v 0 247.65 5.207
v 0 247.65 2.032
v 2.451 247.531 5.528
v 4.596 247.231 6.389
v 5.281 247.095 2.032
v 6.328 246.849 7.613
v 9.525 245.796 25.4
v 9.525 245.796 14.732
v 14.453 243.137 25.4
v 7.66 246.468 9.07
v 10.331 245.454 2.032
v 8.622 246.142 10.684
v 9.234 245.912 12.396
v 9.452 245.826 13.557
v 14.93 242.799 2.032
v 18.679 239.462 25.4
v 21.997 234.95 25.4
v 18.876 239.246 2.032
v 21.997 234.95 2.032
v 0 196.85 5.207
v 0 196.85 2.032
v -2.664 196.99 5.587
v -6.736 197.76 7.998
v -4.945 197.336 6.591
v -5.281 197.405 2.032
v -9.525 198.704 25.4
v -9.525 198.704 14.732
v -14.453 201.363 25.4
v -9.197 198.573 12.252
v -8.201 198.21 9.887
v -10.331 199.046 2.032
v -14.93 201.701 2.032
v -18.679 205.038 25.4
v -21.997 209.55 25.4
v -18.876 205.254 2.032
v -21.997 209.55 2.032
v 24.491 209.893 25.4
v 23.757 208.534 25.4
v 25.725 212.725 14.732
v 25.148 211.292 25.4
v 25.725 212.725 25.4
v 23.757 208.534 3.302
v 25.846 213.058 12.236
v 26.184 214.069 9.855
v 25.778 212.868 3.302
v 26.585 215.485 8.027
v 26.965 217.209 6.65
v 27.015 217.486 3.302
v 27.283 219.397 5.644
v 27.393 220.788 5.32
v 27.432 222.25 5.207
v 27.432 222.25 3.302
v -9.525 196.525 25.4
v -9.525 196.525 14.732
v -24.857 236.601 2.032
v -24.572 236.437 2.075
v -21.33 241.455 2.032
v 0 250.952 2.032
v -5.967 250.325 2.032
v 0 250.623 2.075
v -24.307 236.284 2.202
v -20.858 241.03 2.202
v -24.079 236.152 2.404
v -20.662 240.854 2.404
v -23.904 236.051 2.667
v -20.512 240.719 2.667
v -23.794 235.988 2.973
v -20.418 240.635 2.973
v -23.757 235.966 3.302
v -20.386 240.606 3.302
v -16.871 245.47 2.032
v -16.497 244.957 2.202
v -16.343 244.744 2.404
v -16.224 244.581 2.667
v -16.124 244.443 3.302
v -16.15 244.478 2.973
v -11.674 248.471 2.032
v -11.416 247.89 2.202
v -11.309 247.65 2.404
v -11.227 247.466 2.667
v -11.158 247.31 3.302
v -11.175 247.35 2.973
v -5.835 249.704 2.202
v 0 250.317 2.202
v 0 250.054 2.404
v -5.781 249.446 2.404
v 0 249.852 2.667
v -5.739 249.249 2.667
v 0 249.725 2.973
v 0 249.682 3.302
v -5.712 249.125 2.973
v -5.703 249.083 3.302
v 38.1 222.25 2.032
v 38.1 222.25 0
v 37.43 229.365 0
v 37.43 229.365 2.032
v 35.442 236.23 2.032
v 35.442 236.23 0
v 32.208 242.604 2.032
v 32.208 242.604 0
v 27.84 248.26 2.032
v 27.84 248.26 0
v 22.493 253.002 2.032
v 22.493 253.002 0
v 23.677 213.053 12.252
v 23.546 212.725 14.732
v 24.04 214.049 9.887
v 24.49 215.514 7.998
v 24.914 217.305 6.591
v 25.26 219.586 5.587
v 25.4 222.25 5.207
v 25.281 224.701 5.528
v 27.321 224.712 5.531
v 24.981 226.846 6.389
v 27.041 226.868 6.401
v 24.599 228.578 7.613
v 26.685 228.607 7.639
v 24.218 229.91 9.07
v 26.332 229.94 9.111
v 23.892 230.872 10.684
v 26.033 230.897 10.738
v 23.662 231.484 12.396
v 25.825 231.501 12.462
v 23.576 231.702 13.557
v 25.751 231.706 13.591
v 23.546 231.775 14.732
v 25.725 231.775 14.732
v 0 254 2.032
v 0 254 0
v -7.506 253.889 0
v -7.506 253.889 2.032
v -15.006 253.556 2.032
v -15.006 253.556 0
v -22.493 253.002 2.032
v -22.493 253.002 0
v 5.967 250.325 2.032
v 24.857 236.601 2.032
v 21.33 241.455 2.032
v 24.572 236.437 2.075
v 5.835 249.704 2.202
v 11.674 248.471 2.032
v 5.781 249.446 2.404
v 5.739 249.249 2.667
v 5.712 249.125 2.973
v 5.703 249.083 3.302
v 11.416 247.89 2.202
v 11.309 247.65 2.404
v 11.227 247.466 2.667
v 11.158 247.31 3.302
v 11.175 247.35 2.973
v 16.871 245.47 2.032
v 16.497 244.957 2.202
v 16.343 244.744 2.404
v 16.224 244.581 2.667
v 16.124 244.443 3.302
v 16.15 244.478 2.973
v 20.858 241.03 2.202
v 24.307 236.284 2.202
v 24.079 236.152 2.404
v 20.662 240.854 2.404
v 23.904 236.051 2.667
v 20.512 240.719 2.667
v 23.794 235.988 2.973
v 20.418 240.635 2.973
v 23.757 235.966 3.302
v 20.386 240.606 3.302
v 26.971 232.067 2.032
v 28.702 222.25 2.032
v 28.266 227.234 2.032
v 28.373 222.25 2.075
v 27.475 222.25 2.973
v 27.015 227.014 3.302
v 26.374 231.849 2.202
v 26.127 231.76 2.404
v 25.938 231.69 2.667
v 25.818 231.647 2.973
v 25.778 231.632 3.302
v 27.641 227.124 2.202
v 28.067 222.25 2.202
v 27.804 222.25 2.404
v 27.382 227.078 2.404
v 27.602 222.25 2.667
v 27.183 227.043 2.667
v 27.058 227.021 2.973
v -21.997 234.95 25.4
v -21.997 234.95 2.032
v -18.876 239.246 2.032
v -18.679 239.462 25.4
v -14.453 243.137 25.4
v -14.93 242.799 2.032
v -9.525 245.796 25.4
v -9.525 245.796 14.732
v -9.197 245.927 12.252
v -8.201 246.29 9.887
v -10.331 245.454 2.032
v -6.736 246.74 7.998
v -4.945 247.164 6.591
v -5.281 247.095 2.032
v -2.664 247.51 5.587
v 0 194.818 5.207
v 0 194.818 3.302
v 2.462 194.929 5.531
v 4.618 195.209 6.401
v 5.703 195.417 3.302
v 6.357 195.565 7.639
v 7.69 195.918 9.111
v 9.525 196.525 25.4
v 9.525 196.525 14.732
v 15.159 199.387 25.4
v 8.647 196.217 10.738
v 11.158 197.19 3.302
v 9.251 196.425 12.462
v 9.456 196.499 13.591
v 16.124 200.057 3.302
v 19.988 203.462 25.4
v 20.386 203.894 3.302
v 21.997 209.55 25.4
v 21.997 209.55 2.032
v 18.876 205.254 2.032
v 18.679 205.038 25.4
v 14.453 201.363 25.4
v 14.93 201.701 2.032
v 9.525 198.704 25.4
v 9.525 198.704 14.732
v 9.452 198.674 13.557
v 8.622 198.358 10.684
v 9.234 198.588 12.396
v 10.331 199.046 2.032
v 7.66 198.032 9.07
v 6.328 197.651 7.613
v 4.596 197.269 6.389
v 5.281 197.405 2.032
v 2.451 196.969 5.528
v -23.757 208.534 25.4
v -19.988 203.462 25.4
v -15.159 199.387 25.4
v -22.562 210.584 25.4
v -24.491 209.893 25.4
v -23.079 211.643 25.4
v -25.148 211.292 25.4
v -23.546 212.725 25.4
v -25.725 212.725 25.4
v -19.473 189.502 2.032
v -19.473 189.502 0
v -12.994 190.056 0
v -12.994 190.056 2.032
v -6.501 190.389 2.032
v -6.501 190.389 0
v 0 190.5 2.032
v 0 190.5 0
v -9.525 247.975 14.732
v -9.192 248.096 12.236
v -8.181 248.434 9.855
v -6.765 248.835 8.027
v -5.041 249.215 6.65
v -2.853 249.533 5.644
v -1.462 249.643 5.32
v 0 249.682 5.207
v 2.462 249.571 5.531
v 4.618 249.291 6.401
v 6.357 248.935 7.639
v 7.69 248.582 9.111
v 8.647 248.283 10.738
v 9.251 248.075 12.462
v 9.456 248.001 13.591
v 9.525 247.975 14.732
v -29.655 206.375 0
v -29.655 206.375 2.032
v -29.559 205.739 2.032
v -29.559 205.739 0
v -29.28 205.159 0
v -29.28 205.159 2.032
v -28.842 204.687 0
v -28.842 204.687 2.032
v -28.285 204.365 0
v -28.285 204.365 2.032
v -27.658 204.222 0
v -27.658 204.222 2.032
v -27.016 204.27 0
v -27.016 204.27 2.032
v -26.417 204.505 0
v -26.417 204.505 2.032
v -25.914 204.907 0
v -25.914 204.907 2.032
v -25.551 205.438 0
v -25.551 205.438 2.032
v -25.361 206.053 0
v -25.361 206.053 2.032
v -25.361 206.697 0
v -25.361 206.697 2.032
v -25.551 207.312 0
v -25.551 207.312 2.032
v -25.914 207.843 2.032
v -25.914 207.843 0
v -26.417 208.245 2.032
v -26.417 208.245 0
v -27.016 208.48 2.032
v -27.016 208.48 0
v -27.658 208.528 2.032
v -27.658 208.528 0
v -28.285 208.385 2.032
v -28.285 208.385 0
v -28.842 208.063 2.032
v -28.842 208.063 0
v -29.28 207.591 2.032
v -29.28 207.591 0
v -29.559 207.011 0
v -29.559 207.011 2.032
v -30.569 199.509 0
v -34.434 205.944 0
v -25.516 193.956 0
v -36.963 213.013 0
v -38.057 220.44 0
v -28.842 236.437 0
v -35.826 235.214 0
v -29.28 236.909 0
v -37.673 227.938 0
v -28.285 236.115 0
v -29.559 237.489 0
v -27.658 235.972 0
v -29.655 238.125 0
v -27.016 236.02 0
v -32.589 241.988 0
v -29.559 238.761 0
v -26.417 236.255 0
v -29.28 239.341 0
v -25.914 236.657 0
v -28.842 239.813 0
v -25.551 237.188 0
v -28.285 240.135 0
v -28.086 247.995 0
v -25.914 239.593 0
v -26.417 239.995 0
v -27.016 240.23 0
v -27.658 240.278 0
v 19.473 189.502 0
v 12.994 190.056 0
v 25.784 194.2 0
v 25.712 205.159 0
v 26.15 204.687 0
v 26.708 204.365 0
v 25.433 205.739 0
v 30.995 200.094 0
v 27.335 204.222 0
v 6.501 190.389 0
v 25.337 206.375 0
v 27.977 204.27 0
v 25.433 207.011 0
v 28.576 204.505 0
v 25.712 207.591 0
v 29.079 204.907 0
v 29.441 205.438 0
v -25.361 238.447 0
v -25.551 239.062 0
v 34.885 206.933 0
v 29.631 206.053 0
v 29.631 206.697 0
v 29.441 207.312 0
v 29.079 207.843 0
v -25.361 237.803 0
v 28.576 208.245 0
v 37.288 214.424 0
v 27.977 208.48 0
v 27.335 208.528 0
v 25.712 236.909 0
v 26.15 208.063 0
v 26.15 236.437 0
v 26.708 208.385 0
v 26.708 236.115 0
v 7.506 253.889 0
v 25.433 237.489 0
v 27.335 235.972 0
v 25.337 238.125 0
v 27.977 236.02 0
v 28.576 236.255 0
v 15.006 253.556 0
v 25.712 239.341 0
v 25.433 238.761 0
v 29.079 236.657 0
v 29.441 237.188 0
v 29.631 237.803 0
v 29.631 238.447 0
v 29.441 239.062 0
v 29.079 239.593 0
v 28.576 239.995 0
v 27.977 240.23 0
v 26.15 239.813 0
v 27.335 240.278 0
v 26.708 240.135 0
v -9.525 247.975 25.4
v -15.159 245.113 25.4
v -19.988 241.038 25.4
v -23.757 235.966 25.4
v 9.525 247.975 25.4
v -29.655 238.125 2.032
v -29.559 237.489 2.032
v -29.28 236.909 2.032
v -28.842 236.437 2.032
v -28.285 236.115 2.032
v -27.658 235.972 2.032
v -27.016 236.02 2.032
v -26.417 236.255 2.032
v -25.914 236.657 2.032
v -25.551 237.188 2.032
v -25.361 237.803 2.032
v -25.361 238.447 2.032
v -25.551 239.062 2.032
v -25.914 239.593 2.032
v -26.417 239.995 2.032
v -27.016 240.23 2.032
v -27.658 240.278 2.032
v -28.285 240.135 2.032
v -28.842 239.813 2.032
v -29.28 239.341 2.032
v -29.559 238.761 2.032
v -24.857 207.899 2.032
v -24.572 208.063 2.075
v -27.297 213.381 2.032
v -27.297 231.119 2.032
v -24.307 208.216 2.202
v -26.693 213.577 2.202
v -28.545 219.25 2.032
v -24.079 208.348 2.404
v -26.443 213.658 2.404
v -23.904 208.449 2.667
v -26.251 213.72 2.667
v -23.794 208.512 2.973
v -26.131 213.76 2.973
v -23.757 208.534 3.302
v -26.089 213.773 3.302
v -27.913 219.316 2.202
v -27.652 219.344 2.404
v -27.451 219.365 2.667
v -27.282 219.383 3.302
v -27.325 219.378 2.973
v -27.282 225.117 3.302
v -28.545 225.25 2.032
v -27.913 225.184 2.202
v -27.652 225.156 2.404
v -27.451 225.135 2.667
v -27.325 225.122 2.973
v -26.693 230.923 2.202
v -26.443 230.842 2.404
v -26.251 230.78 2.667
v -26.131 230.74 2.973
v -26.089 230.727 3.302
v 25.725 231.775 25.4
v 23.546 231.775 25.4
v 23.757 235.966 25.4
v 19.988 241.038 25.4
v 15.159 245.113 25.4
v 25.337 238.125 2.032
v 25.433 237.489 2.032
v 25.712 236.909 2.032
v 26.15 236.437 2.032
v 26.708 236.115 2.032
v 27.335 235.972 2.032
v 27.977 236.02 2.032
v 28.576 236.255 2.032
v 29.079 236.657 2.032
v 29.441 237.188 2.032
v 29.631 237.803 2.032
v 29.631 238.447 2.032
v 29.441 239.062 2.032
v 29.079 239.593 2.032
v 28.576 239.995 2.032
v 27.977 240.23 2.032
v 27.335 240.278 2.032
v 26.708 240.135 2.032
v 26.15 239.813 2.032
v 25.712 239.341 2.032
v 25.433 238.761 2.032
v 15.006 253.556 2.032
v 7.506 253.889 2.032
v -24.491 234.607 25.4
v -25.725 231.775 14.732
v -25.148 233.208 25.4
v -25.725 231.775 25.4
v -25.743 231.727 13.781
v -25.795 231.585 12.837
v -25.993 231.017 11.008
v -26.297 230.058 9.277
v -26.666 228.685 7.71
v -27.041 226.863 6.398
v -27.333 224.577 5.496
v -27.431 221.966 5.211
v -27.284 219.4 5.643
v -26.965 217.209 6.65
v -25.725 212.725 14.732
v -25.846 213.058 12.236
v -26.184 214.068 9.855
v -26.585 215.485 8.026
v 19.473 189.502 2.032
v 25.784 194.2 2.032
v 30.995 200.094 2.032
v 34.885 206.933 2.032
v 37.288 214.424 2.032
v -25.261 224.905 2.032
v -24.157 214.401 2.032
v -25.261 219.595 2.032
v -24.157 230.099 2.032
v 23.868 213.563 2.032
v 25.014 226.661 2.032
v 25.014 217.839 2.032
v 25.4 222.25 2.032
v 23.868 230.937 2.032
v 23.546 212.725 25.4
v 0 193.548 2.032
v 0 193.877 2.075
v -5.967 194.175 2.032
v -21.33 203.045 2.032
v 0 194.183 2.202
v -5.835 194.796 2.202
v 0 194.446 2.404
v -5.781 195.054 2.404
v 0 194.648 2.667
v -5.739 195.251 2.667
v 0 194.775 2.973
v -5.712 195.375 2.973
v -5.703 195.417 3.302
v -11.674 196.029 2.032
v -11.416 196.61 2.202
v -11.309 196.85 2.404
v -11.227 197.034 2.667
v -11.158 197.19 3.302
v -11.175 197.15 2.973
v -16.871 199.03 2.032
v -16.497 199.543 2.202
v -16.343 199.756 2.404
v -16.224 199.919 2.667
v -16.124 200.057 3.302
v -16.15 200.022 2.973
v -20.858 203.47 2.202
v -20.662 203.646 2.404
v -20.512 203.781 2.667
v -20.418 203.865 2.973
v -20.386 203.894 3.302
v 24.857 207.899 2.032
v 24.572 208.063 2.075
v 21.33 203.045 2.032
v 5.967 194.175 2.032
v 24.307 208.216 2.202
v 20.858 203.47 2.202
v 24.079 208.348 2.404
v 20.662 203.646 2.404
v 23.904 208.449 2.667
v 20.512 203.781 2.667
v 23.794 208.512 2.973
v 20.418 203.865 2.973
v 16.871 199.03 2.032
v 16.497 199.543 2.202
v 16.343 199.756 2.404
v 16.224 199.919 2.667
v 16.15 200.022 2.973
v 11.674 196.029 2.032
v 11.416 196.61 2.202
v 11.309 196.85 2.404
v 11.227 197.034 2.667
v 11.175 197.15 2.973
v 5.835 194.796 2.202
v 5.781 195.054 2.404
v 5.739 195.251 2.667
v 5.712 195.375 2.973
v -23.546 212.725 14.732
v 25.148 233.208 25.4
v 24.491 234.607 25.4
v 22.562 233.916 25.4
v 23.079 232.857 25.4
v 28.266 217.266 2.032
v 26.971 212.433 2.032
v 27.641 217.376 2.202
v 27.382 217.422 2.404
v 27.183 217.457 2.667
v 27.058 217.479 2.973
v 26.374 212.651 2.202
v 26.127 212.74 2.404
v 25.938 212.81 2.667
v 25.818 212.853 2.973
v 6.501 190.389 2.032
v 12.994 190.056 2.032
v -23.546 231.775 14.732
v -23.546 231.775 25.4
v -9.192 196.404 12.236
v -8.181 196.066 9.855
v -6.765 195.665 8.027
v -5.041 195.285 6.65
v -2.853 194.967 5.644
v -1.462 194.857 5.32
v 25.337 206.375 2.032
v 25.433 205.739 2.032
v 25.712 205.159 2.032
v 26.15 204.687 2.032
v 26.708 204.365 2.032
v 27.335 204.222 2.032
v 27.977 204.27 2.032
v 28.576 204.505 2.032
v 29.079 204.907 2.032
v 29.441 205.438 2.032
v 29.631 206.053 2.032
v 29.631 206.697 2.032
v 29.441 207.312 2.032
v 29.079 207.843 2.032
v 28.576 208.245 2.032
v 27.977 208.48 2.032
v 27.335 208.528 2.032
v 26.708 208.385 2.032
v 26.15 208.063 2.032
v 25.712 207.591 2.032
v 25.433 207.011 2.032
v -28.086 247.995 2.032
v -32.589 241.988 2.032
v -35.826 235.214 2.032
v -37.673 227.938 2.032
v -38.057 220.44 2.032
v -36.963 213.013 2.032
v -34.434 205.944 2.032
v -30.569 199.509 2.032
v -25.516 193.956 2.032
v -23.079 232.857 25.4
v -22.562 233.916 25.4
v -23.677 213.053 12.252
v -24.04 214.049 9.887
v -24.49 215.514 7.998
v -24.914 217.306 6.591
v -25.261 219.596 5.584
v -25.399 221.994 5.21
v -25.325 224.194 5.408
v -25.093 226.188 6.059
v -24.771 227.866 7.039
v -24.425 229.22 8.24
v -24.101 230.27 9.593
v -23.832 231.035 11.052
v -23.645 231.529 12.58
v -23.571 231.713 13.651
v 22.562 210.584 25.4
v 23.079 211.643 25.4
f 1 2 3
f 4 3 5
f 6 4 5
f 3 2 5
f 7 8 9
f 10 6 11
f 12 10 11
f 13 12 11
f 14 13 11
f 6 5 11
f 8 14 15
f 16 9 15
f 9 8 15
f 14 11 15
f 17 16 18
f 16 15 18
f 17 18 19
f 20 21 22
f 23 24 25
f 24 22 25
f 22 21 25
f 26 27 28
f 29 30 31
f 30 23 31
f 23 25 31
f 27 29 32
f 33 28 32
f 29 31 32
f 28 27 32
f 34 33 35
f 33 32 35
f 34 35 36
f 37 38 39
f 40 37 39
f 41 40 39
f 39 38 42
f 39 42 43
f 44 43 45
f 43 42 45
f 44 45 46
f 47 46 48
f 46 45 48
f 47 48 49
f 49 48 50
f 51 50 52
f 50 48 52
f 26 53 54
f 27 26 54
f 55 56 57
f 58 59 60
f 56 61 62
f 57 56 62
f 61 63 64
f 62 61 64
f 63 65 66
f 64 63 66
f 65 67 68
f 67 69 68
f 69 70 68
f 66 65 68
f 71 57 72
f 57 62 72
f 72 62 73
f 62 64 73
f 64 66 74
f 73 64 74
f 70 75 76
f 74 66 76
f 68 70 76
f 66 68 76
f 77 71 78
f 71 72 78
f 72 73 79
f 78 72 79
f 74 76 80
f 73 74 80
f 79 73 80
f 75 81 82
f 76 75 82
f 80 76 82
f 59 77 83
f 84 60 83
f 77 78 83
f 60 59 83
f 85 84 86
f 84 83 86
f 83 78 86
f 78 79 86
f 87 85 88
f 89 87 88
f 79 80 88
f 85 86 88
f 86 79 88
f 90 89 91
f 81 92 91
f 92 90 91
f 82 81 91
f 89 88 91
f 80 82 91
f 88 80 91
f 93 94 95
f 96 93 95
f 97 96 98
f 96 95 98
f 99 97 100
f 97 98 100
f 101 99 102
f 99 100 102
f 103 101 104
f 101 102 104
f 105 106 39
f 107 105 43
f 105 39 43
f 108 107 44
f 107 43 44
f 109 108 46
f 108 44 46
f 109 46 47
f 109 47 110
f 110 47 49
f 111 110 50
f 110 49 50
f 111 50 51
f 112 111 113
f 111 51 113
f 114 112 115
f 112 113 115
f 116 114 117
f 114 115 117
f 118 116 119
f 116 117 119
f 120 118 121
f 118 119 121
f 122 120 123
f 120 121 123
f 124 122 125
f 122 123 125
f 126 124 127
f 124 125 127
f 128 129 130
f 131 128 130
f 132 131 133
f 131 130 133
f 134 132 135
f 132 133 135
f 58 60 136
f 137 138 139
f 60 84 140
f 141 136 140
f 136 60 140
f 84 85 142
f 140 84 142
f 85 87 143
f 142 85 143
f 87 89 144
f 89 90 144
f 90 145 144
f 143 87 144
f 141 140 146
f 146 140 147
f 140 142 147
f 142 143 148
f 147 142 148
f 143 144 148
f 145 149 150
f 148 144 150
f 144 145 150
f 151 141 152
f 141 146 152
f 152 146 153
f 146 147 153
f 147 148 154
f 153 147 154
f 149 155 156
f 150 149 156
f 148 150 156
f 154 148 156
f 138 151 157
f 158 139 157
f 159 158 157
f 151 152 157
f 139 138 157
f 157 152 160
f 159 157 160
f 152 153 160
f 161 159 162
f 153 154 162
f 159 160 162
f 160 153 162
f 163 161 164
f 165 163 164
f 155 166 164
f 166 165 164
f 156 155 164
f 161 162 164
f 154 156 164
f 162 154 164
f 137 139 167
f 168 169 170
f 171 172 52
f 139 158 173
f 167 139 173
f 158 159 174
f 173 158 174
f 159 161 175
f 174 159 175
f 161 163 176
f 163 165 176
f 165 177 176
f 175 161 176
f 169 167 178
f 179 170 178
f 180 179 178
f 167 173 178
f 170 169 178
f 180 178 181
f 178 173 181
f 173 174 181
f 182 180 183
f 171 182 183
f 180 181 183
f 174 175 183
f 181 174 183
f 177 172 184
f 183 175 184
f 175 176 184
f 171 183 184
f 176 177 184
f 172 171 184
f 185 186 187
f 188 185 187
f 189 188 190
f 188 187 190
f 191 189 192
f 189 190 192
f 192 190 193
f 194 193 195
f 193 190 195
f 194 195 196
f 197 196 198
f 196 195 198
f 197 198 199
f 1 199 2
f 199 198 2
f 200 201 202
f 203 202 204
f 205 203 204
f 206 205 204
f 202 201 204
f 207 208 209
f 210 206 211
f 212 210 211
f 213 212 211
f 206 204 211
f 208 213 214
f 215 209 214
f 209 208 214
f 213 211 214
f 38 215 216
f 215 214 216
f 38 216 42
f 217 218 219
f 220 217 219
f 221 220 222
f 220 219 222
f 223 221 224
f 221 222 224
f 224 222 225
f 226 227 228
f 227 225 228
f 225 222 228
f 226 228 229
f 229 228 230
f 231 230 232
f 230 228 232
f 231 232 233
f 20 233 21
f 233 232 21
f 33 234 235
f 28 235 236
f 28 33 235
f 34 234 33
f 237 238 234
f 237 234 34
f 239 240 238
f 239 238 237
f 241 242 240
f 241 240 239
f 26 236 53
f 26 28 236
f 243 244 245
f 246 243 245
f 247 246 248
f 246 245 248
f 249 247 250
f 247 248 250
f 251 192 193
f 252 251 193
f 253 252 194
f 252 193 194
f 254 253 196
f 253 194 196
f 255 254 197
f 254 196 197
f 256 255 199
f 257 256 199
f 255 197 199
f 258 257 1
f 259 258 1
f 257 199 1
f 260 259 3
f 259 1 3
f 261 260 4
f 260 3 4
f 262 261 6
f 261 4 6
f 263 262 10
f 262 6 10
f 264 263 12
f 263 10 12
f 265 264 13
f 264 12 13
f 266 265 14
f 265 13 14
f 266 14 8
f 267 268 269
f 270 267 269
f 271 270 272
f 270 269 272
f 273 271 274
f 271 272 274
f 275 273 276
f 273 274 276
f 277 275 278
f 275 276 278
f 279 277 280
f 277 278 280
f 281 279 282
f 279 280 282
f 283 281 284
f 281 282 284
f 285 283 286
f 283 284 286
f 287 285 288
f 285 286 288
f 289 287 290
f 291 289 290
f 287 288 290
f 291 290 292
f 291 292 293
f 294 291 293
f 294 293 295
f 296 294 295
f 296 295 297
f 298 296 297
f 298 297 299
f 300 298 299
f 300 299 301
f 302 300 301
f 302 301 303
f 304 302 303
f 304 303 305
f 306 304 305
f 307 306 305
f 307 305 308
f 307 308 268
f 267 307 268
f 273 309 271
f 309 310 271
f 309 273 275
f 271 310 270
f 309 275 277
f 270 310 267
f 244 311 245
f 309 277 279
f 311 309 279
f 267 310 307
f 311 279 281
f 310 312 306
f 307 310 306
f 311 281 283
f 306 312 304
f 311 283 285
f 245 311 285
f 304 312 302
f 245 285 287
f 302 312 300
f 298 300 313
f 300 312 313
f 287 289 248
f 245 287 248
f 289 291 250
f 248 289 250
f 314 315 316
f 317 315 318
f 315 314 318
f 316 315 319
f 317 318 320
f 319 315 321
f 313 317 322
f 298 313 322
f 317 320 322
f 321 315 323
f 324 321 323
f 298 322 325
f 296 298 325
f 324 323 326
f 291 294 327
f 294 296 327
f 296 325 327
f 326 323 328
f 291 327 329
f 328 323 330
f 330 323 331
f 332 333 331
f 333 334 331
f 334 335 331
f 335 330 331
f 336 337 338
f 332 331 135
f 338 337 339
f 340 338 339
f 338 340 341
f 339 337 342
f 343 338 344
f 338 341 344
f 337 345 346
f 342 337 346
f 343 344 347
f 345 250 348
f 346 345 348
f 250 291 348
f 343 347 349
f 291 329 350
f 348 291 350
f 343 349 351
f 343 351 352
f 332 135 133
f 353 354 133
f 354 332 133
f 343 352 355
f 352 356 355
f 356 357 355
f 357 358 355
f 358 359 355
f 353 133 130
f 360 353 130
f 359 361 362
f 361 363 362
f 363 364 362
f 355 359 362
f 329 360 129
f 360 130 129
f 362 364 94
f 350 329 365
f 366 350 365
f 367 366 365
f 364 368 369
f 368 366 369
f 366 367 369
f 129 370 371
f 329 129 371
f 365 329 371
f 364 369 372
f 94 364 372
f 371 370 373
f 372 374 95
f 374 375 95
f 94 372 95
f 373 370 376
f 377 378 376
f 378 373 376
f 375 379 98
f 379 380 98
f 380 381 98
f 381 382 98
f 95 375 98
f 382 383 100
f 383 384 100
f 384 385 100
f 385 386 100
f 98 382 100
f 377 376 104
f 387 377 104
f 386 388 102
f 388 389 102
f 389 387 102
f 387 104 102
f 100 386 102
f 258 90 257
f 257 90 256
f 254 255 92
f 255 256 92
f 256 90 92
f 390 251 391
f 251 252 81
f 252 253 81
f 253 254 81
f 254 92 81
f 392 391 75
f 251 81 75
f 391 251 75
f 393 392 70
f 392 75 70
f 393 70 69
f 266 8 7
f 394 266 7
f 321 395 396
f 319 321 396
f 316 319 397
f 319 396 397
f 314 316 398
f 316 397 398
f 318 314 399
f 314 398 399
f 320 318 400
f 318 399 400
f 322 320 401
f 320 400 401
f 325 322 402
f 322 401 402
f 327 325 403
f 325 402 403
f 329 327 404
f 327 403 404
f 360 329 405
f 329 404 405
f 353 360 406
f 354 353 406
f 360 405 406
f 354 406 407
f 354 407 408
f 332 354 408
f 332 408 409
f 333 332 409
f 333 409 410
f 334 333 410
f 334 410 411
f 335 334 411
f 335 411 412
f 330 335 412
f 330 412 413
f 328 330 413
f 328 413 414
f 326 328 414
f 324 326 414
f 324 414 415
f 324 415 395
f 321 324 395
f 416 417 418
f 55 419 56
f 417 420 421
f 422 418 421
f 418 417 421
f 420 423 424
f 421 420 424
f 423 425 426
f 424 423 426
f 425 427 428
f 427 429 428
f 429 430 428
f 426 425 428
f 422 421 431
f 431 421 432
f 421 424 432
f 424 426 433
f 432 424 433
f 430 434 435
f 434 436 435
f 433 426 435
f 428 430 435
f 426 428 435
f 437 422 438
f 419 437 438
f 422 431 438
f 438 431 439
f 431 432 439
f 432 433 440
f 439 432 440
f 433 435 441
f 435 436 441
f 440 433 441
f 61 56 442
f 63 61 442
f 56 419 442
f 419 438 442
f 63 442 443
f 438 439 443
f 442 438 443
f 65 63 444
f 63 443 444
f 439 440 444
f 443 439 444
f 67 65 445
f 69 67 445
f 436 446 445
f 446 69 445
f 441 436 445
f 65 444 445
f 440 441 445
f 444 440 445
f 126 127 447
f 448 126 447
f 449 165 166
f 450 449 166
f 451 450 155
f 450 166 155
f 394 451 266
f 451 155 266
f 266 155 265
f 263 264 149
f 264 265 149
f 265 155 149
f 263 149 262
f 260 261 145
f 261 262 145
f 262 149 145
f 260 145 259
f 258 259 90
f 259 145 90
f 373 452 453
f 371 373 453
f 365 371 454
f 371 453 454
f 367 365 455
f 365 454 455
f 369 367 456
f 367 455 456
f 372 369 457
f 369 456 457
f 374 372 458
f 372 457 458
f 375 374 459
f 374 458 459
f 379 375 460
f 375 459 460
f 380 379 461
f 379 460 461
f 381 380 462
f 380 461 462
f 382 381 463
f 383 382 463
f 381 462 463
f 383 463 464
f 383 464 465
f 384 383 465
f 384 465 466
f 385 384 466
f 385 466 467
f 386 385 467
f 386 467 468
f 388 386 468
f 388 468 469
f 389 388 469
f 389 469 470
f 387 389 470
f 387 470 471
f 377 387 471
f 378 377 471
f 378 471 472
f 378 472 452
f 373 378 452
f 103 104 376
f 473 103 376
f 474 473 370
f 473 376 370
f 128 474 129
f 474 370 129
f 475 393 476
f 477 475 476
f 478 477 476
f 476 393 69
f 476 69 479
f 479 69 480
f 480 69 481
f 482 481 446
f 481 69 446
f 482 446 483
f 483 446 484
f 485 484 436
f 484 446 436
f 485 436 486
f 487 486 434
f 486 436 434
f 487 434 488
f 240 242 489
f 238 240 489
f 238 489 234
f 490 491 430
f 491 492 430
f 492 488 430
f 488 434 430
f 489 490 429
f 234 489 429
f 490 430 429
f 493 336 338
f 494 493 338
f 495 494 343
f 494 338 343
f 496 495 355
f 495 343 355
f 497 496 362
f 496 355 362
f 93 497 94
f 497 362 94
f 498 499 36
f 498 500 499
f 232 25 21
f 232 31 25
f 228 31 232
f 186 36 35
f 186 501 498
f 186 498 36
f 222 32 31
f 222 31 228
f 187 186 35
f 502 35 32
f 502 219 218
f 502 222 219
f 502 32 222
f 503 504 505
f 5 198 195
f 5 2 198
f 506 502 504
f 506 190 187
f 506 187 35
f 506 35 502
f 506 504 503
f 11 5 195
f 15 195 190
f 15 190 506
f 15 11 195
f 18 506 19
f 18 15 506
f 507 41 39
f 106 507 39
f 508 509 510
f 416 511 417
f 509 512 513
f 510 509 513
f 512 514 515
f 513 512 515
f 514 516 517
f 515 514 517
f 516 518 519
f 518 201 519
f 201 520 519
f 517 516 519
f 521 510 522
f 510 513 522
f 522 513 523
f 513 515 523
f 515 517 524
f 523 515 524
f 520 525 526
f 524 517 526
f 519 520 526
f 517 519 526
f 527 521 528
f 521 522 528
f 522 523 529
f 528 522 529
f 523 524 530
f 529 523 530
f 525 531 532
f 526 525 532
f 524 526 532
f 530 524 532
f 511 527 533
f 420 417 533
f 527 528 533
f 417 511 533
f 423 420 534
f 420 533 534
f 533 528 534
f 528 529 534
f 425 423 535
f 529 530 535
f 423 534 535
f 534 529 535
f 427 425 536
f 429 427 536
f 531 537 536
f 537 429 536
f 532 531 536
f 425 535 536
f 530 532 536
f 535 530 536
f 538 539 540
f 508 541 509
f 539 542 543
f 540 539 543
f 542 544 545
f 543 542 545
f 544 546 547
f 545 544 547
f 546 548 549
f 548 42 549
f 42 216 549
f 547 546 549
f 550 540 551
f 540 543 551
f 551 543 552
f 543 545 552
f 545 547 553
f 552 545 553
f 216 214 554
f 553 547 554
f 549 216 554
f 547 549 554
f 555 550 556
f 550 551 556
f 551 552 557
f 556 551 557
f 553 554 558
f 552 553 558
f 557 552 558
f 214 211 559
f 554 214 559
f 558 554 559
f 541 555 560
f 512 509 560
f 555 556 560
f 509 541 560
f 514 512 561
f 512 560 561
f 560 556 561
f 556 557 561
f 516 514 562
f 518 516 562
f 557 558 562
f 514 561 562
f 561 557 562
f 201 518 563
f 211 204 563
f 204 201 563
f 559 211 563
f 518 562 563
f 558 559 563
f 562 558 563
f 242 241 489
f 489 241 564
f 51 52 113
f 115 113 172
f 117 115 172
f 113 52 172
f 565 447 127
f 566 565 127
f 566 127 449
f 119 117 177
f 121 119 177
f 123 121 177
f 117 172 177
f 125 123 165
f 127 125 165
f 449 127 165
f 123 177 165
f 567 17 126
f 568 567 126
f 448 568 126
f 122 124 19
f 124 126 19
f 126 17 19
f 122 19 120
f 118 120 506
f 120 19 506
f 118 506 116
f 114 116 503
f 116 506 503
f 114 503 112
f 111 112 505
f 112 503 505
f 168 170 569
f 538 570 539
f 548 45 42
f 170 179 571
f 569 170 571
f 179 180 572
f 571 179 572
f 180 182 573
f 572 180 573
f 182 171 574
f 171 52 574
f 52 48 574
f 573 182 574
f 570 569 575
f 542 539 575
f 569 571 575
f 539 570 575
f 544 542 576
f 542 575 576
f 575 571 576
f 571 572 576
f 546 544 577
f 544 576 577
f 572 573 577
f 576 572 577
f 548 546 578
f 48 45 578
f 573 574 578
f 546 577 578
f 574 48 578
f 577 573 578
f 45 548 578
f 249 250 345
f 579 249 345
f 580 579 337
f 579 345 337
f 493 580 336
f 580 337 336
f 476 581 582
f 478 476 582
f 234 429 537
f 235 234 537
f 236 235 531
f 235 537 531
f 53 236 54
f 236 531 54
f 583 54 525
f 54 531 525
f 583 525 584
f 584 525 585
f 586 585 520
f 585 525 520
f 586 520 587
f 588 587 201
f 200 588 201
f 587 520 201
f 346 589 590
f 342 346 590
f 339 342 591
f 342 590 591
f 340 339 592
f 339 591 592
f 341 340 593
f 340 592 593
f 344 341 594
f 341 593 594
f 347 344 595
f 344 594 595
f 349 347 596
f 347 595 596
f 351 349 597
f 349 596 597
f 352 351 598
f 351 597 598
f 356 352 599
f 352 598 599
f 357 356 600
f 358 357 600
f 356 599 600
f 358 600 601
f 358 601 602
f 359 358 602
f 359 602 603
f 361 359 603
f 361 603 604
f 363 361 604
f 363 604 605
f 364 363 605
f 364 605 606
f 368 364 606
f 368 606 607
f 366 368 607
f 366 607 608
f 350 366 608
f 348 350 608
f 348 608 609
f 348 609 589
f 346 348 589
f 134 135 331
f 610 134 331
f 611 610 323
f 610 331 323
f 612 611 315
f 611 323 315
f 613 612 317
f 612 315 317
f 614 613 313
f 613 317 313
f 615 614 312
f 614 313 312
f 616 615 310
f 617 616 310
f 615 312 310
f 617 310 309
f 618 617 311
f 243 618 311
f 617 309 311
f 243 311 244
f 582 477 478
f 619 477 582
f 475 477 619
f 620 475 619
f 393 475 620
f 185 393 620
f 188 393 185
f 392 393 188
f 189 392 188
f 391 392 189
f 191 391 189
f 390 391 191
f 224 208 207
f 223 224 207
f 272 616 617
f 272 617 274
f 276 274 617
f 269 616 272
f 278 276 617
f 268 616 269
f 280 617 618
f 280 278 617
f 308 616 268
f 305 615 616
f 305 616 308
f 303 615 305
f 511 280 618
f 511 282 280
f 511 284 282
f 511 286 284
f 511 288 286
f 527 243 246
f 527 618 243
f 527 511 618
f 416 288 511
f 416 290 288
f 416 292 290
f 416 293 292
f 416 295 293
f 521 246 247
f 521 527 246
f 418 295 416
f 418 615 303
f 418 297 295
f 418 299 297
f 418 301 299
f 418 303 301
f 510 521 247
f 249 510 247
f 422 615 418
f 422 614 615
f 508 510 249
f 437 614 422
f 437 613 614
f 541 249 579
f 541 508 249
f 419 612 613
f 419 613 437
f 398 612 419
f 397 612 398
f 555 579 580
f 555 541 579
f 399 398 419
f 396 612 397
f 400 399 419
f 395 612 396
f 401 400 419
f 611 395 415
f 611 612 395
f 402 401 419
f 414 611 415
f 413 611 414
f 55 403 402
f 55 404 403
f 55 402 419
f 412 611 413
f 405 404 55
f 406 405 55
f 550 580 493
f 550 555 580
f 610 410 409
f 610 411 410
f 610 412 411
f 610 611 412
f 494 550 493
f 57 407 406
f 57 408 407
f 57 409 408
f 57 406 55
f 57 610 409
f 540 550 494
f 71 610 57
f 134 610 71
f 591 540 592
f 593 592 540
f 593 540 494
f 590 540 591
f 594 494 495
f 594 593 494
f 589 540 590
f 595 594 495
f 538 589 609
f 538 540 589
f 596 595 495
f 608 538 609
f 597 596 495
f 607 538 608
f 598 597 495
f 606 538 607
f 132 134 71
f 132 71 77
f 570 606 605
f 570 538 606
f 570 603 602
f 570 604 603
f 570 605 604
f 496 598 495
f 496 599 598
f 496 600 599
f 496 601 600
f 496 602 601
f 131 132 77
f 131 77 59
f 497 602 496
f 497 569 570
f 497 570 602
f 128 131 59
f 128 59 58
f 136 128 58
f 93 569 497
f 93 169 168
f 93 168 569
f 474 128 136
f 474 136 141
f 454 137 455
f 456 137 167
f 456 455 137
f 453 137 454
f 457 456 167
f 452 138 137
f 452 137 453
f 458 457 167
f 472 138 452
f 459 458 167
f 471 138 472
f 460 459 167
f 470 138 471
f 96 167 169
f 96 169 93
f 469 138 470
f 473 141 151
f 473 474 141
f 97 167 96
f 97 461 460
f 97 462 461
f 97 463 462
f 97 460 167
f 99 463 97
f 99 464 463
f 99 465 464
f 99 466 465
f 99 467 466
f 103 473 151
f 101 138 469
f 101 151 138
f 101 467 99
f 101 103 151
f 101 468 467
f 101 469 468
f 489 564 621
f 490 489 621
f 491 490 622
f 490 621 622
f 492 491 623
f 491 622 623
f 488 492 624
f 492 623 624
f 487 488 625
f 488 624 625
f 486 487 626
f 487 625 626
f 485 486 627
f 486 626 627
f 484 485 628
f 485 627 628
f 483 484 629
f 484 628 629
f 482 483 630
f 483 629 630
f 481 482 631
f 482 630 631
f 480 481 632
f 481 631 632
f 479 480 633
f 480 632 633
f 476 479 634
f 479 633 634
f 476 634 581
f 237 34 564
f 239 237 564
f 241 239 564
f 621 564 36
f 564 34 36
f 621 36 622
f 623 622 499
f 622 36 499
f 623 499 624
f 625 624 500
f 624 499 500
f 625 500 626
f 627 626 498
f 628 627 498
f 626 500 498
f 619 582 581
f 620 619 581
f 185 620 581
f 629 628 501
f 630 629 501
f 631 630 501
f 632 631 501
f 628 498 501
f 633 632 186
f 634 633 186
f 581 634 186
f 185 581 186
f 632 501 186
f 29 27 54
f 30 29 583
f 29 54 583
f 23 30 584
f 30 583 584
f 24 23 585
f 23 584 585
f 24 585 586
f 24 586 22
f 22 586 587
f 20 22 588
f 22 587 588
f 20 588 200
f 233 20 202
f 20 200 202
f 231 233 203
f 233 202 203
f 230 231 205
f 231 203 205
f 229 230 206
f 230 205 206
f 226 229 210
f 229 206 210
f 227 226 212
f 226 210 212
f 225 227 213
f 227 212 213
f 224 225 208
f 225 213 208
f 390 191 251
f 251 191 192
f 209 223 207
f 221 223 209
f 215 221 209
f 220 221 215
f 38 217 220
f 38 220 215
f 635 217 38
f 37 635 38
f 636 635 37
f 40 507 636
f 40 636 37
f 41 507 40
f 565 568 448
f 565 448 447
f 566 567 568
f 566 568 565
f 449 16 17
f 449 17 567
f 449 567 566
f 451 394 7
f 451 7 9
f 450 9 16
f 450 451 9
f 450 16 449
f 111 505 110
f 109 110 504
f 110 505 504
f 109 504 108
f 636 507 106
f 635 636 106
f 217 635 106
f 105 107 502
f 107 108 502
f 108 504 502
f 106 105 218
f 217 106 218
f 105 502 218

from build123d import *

# Parameters (mm, degrees)
F1_DEPTH  = 2.032
F2_DEPTH  = 25.4
F3_D      = 4.318
F3_DEPTH  = 5.08
F3_TIP    = 1.2972580765
F6_DEPTH  = 63.5
F10_DEPTH = 63.5
F11_R     = 1.27


with BuildPart() as f1:
    # F0 (on Top) → F1 (new body)
    with BuildSketch(Plane.XY):
        with BuildLine():
            ThreePointArc((-19.4727464049, 189.5021428571), (-9.7491483145, 190.2503721603), (0, 190.5))
            ThreePointArc((0, 190.5), (-15.875, 194.7536934298), (-27.4963065702, 206.375))
            ThreePointArc((-27.4963065702, 206.375), (-31.75, 222.25), (-27.4963065702, 238.125))
            ThreePointArc((-27.4963065702, 238.125), (-15.875, 249.7463065702), (0, 254))
            ThreePointArc((0, 254), (-11.2573468074, 253.750413089), (-22.4925700998, 253.0021428571))
            ThreePointArc((-22.4925700998, 253.0021428571), (-38.0569894676, 220.440151204), (-19.4727464049, 189.5021428571))
        make_face()
        with BuildLine():
            Line((0, 249.682), (0, 254))
            ThreePointArc((0, 254), (-15.875, 249.7463065702), (-27.4963065702, 238.125))
            Line((-27.4963065702, 238.125), (-23.7568088766, 235.966))
            ThreePointArc((-23.7568088766, 235.966), (-13.716, 246.0068088766), (0, 249.682))
        make_face()
        with BuildLine():
            ThreePointArc((-27.4963065702, 238.125), (-31.75, 222.25), (-27.4963065702, 206.375))
            Line((-27.4963065702, 206.375), (-23.7568088766, 208.534))
            ThreePointArc((-23.7568088766, 208.534), (-27.432, 222.25), (-23.7568088766, 235.966))
            Line((-23.7568088766, 235.966), (-27.4963065702, 238.125))
        make_face()
        with BuildLine():
            ThreePointArc((-23.7568088766, 235.966), (-27.432, 222.25), (-23.7568088766, 208.534))
            Line((-23.7568088766, 208.534), (-21.9970452561, 209.55))
            ThreePointArc((-21.9970452561, 209.55), (-25.4, 222.25), (-21.9970452561, 234.95))
            Line((-21.9970452561, 234.95), (-23.7568088766, 235.966))
        make_face()
        with BuildLine():
            ThreePointArc((-27.4963065702, 206.375), (-15.875, 194.7536934298), (0, 190.5))
            Line((0, 190.5), (0, 194.818))
            ThreePointArc((0, 194.818), (-13.716, 198.4931911234), (-23.7568088766, 208.534))
            Line((-23.7568088766, 208.534), (-27.4963065702, 206.375))
        make_face()
        with BuildLine():
            ThreePointArc((-23.7568088766, 208.534), (-13.716, 198.4931911234), (0, 194.818))
            Line((0, 194.818), (0, 196.85))
            ThreePointArc((0, 196.85), (-12.7, 200.2529547439), (-21.9970452561, 209.55))
            Line((-21.9970452561, 209.55), (-23.7568088766, 208.534))
        make_face()
        with BuildLine():
            ThreePointArc((-21.9970452561, 209.55), (-12.7, 200.2529547439), (0, 196.85))
            Line((0, 196.85), (0, 222.25))
            Line((0, 222.25), (-21.9970452561, 209.55))
        make_face()
        with BuildLine():
            Line((-21.9970452561, 209.55), (0, 222.25))
            Line((0, 222.25), (-21.9970452561, 234.95))
            ThreePointArc((-21.9970452561, 234.95), (-25.4, 222.25), (-21.9970452561, 209.55))
        make_face()
        with BuildLine():
            Line((-21.9970452561, 234.95), (0, 222.25))
            Line((0, 222.25), (0, 247.65))
            ThreePointArc((0, 247.65), (-12.7, 244.2470452561), (-21.9970452561, 234.95))
        make_face()
        with BuildLine():
            Line((0, 247.65), (0, 249.682))
            ThreePointArc((0, 249.682), (-13.716, 246.0068088766), (-23.7568088766, 235.966))
            Line((-23.7568088766, 235.966), (-21.9970452561, 234.95))
            ThreePointArc((-21.9970452561, 234.95), (-12.7, 244.2470452561), (0, 247.65))
        make_face()
        with BuildLine():
            ThreePointArc((27.4963065702, 238.125), (15.875, 249.7463065702), (0, 254))
            Line((0, 254), (0, 249.682))
            ThreePointArc((0, 249.682), (13.716, 246.0068088766), (23.7568088766, 235.966))
            Line((23.7568088766, 235.966), (27.4963065702, 238.125))
        make_face()
        with BuildLine():
            ThreePointArc((23.7568088766, 235.966), (13.716, 246.0068088766), (0, 249.682))
            Line((0, 249.682), (0, 247.65))
            ThreePointArc((0, 247.65), (12.7, 244.2470452561), (21.9970452561, 234.95))
            Line((21.9970452561, 234.95), (23.7568088766, 235.966))
        make_face()
        with BuildLine():
            Line((0, 247.65), (0, 222.25))
            Line((0, 222.25), (21.9970452561, 234.95))
            ThreePointArc((21.9970452561, 234.95), (12.7, 244.2470452561), (0, 247.65))
        make_face()
        with BuildLine():
            ThreePointArc((0, 190.5), (9.7491483145, 190.2503721603), (19.4727464049, 189.5021428571))
            ThreePointArc((19.4727464049, 189.5021428571), (33.1173794104, 203.4125590648), (38.1, 222.25))
            ThreePointArc((38.1, 222.25), (33.9748209767, 239.493014226), (22.4925700998, 253.0021428571))
            ThreePointArc((22.4925700998, 253.0021428571), (11.2573468074, 253.750413089), (0, 254))
            ThreePointArc((0, 254), (15.875, 249.7463065702), (27.4963065702, 238.125))
            ThreePointArc((27.4963065702, 238.125), (30.6681449847, 230.467504682), (31.75, 222.25))
            ThreePointArc((31.75, 222.25), (30.6681449847, 214.032495318), (27.4963065702, 206.375))
            ThreePointArc((27.4963065702, 206.375), (15.875, 194.7536934298), (0, 190.5))
        make_face()
        with BuildLine():
            Line((23.7568088766, 208.534), (27.4963065702, 206.375))
            ThreePointArc((27.4963065702, 206.375), (30.6681449847, 214.032495318), (31.75, 222.25))
            ThreePointArc((31.75, 222.25), (30.6681449847, 230.467504682), (27.4963065702, 238.125))
            Line((27.4963065702, 238.125), (23.7568088766, 235.966))
            ThreePointArc((23.7568088766, 235.966), (26.4972772668, 229.3499240453), (27.432, 222.25))
            ThreePointArc((27.432, 222.25), (26.4972772668, 215.1500759547), (23.7568088766, 208.534))
        make_face()
        with BuildLine():
            Line((21.9970452561, 209.55), (23.7568088766, 208.534))
            ThreePointArc((23.7568088766, 208.534), (26.4972772668, 215.1500759547), (27.432, 222.25))
            ThreePointArc((27.432, 222.25), (26.4972772668, 229.3499240453), (23.7568088766, 235.966))
            Line((23.7568088766, 235.966), (21.9970452561, 234.95))
            ThreePointArc((21.9970452561, 234.95), (24.5345159877, 228.8240037456), (25.4, 222.25))
            ThreePointArc((25.4, 222.25), (24.5345159877, 215.6759962544), (21.9970452561, 209.55))
        make_face()
        with BuildLine():
            Line((21.9970452561, 234.95), (0, 222.25))
            Line((0, 222.25), (21.9970452561, 209.55))
            ThreePointArc((21.9970452561, 209.55), (24.5345159877, 215.6759962544), (25.4, 222.25))
            ThreePointArc((25.4, 222.25), (24.5345159877, 228.8240037456), (21.9970452561, 234.95))
        make_face()
        with BuildLine():
            Line((0, 222.25), (0, 196.85))
            ThreePointArc((0, 196.85), (12.7, 200.2529547439), (21.9970452561, 209.55))
            Line((21.9970452561, 209.55), (0, 222.25))
        make_face()
        with BuildLine():
            Line((0, 196.85), (0, 194.818))
            ThreePointArc((0, 194.818), (13.716, 198.4931911234), (23.7568088766, 208.534))
            Line((23.7568088766, 208.534), (21.9970452561, 209.55))
            ThreePointArc((21.9970452561, 209.55), (12.7, 200.2529547439), (0, 196.85))
        make_face()
        with BuildLine():
            Line((0, 194.818), (0, 190.5))
            ThreePointArc((0, 190.5), (15.875, 194.7536934298), (27.4963065702, 206.375))
            Line((27.4963065702, 206.375), (23.7568088766, 208.534))
            ThreePointArc((23.7568088766, 208.534), (13.716, 198.4931911234), (0, 194.818))
        make_face()
    extrude(amount=F1_DEPTH)

    # F0 (on Top) → F2 (join)
    with BuildSketch(Plane.XY):
        with BuildLine():
            ThreePointArc((-23.7568088766, 208.534), (-13.716, 198.4931911234), (0, 194.818))
            Line((0, 194.818), (0, 196.85))
            ThreePointArc((0, 196.85), (-12.7, 200.2529547439), (-21.9970452561, 209.55))
            Line((-21.9970452561, 209.55), (-23.7568088766, 208.534))
        make_face()
        with BuildLine():
            ThreePointArc((-23.7568088766, 235.966), (-27.432, 222.25), (-23.7568088766, 208.534))
            Line((-23.7568088766, 208.534), (-21.9970452561, 209.55))
            ThreePointArc((-21.9970452561, 209.55), (-25.4, 222.25), (-21.9970452561, 234.95))
            Line((-21.9970452561, 234.95), (-23.7568088766, 235.966))
        make_face()
        with BuildLine():
            Line((0, 247.65), (0, 249.682))
            ThreePointArc((0, 249.682), (-13.716, 246.0068088766), (-23.7568088766, 235.966))
            Line((-23.7568088766, 235.966), (-21.9970452561, 234.95))
            ThreePointArc((-21.9970452561, 234.95), (-12.7, 244.2470452561), (0, 247.65))
        make_face()
        with BuildLine():
            ThreePointArc((23.7568088766, 235.966), (13.716, 246.0068088766), (0, 249.682))
            Line((0, 249.682), (0, 247.65))
            ThreePointArc((0, 247.65), (12.7, 244.2470452561), (21.9970452561, 234.95))
            Line((21.9970452561, 234.95), (23.7568088766, 235.966))
        make_face()
        with BuildLine():
            Line((21.9970452561, 209.55), (23.7568088766, 208.534))
            ThreePointArc((23.7568088766, 208.534), (26.4972772668, 215.1500759547), (27.432, 222.25))
            ThreePointArc((27.432, 222.25), (26.4972772668, 229.3499240453), (23.7568088766, 235.966))
            Line((23.7568088766, 235.966), (21.9970452561, 234.95))
            ThreePointArc((21.9970452561, 234.95), (24.5345159877, 228.8240037456), (25.4, 222.25))
            ThreePointArc((25.4, 222.25), (24.5345159877, 215.6759962544), (21.9970452561, 209.55))
        make_face()
        with BuildLine():
            Line((0, 196.85), (0, 194.818))
            ThreePointArc((0, 194.818), (13.716, 198.4931911234), (23.7568088766, 208.534))
            Line((23.7568088766, 208.534), (21.9970452561, 209.55))
            ThreePointArc((21.9970452561, 209.55), (12.7, 200.2529547439), (0, 196.85))
        make_face()
    extrude(amount=F2_DEPTH)

    # F3
    with Locations(Plane(origin=(0, 0, 0), x_dir=(1, 0, 0), z_dir=(0, 0, -1))):
        with Locations((-27.4963065702, -206.375), (-27.4963065702, -238.125), (27.4963065702, -238.125), (27.4963065702, -206.375)):
            Hole(F3_D / 2, depth=F3_DEPTH)
            with Locations((0, 0, -(F3_DEPTH + F3_TIP / 2))):  # 118° drill point
                Cone(0, F3_D / 2, F3_TIP, mode=Mode.SUBTRACT)

    # F5 (on line) → F6 (cut, symmetric)
    with BuildSketch(Plane.YZ):
        with BuildLine():
            Line((212.725, 28.6151301116), (212.725, 14.732))
            ThreePointArc((212.725, 14.732), (215.5148079092, 7.9968079092), (222.25, 5.207))
            ThreePointArc((222.25, 5.207), (228.9851920908, 7.9968079092), (231.775, 14.732))
            Line((231.775, 14.732), (231.775, 28.6151301116))
            Line((231.775, 28.6151301116), (212.725, 28.6151301116))
        make_face()
    extrude(amount=F6_DEPTH, both=True, mode=Mode.SUBTRACT)

    # F9 (on line) → F10 (cut, symmetric)
    with BuildSketch(Plane.XZ.offset(-222.25)):
        with BuildLine():
            Line((-9.525, 30.1762204617), (-9.525, 14.732))
            ThreePointArc((-9.525, 14.732), (-6.7351920908, 7.9968079092), (0, 5.207))
            ThreePointArc((0, 5.207), (6.7351920908, 7.9968079092), (9.525, 14.732))
            Line((9.525, 14.732), (9.525, 30.1762204617))
            Line((9.525, 30.1762204617), (-9.525, 30.1762204617))
        make_face()
    extrude(amount=F10_DEPTH, both=True, mode=Mode.SUBTRACT)

    # F11
    f11_edges = [f1.edges().sort_by_distance(p)[0] for p in [
        (0, 249.682, 2.032),
    ]]
    fillet(f11_edges, radius=F11_R)


solid = f1.part
